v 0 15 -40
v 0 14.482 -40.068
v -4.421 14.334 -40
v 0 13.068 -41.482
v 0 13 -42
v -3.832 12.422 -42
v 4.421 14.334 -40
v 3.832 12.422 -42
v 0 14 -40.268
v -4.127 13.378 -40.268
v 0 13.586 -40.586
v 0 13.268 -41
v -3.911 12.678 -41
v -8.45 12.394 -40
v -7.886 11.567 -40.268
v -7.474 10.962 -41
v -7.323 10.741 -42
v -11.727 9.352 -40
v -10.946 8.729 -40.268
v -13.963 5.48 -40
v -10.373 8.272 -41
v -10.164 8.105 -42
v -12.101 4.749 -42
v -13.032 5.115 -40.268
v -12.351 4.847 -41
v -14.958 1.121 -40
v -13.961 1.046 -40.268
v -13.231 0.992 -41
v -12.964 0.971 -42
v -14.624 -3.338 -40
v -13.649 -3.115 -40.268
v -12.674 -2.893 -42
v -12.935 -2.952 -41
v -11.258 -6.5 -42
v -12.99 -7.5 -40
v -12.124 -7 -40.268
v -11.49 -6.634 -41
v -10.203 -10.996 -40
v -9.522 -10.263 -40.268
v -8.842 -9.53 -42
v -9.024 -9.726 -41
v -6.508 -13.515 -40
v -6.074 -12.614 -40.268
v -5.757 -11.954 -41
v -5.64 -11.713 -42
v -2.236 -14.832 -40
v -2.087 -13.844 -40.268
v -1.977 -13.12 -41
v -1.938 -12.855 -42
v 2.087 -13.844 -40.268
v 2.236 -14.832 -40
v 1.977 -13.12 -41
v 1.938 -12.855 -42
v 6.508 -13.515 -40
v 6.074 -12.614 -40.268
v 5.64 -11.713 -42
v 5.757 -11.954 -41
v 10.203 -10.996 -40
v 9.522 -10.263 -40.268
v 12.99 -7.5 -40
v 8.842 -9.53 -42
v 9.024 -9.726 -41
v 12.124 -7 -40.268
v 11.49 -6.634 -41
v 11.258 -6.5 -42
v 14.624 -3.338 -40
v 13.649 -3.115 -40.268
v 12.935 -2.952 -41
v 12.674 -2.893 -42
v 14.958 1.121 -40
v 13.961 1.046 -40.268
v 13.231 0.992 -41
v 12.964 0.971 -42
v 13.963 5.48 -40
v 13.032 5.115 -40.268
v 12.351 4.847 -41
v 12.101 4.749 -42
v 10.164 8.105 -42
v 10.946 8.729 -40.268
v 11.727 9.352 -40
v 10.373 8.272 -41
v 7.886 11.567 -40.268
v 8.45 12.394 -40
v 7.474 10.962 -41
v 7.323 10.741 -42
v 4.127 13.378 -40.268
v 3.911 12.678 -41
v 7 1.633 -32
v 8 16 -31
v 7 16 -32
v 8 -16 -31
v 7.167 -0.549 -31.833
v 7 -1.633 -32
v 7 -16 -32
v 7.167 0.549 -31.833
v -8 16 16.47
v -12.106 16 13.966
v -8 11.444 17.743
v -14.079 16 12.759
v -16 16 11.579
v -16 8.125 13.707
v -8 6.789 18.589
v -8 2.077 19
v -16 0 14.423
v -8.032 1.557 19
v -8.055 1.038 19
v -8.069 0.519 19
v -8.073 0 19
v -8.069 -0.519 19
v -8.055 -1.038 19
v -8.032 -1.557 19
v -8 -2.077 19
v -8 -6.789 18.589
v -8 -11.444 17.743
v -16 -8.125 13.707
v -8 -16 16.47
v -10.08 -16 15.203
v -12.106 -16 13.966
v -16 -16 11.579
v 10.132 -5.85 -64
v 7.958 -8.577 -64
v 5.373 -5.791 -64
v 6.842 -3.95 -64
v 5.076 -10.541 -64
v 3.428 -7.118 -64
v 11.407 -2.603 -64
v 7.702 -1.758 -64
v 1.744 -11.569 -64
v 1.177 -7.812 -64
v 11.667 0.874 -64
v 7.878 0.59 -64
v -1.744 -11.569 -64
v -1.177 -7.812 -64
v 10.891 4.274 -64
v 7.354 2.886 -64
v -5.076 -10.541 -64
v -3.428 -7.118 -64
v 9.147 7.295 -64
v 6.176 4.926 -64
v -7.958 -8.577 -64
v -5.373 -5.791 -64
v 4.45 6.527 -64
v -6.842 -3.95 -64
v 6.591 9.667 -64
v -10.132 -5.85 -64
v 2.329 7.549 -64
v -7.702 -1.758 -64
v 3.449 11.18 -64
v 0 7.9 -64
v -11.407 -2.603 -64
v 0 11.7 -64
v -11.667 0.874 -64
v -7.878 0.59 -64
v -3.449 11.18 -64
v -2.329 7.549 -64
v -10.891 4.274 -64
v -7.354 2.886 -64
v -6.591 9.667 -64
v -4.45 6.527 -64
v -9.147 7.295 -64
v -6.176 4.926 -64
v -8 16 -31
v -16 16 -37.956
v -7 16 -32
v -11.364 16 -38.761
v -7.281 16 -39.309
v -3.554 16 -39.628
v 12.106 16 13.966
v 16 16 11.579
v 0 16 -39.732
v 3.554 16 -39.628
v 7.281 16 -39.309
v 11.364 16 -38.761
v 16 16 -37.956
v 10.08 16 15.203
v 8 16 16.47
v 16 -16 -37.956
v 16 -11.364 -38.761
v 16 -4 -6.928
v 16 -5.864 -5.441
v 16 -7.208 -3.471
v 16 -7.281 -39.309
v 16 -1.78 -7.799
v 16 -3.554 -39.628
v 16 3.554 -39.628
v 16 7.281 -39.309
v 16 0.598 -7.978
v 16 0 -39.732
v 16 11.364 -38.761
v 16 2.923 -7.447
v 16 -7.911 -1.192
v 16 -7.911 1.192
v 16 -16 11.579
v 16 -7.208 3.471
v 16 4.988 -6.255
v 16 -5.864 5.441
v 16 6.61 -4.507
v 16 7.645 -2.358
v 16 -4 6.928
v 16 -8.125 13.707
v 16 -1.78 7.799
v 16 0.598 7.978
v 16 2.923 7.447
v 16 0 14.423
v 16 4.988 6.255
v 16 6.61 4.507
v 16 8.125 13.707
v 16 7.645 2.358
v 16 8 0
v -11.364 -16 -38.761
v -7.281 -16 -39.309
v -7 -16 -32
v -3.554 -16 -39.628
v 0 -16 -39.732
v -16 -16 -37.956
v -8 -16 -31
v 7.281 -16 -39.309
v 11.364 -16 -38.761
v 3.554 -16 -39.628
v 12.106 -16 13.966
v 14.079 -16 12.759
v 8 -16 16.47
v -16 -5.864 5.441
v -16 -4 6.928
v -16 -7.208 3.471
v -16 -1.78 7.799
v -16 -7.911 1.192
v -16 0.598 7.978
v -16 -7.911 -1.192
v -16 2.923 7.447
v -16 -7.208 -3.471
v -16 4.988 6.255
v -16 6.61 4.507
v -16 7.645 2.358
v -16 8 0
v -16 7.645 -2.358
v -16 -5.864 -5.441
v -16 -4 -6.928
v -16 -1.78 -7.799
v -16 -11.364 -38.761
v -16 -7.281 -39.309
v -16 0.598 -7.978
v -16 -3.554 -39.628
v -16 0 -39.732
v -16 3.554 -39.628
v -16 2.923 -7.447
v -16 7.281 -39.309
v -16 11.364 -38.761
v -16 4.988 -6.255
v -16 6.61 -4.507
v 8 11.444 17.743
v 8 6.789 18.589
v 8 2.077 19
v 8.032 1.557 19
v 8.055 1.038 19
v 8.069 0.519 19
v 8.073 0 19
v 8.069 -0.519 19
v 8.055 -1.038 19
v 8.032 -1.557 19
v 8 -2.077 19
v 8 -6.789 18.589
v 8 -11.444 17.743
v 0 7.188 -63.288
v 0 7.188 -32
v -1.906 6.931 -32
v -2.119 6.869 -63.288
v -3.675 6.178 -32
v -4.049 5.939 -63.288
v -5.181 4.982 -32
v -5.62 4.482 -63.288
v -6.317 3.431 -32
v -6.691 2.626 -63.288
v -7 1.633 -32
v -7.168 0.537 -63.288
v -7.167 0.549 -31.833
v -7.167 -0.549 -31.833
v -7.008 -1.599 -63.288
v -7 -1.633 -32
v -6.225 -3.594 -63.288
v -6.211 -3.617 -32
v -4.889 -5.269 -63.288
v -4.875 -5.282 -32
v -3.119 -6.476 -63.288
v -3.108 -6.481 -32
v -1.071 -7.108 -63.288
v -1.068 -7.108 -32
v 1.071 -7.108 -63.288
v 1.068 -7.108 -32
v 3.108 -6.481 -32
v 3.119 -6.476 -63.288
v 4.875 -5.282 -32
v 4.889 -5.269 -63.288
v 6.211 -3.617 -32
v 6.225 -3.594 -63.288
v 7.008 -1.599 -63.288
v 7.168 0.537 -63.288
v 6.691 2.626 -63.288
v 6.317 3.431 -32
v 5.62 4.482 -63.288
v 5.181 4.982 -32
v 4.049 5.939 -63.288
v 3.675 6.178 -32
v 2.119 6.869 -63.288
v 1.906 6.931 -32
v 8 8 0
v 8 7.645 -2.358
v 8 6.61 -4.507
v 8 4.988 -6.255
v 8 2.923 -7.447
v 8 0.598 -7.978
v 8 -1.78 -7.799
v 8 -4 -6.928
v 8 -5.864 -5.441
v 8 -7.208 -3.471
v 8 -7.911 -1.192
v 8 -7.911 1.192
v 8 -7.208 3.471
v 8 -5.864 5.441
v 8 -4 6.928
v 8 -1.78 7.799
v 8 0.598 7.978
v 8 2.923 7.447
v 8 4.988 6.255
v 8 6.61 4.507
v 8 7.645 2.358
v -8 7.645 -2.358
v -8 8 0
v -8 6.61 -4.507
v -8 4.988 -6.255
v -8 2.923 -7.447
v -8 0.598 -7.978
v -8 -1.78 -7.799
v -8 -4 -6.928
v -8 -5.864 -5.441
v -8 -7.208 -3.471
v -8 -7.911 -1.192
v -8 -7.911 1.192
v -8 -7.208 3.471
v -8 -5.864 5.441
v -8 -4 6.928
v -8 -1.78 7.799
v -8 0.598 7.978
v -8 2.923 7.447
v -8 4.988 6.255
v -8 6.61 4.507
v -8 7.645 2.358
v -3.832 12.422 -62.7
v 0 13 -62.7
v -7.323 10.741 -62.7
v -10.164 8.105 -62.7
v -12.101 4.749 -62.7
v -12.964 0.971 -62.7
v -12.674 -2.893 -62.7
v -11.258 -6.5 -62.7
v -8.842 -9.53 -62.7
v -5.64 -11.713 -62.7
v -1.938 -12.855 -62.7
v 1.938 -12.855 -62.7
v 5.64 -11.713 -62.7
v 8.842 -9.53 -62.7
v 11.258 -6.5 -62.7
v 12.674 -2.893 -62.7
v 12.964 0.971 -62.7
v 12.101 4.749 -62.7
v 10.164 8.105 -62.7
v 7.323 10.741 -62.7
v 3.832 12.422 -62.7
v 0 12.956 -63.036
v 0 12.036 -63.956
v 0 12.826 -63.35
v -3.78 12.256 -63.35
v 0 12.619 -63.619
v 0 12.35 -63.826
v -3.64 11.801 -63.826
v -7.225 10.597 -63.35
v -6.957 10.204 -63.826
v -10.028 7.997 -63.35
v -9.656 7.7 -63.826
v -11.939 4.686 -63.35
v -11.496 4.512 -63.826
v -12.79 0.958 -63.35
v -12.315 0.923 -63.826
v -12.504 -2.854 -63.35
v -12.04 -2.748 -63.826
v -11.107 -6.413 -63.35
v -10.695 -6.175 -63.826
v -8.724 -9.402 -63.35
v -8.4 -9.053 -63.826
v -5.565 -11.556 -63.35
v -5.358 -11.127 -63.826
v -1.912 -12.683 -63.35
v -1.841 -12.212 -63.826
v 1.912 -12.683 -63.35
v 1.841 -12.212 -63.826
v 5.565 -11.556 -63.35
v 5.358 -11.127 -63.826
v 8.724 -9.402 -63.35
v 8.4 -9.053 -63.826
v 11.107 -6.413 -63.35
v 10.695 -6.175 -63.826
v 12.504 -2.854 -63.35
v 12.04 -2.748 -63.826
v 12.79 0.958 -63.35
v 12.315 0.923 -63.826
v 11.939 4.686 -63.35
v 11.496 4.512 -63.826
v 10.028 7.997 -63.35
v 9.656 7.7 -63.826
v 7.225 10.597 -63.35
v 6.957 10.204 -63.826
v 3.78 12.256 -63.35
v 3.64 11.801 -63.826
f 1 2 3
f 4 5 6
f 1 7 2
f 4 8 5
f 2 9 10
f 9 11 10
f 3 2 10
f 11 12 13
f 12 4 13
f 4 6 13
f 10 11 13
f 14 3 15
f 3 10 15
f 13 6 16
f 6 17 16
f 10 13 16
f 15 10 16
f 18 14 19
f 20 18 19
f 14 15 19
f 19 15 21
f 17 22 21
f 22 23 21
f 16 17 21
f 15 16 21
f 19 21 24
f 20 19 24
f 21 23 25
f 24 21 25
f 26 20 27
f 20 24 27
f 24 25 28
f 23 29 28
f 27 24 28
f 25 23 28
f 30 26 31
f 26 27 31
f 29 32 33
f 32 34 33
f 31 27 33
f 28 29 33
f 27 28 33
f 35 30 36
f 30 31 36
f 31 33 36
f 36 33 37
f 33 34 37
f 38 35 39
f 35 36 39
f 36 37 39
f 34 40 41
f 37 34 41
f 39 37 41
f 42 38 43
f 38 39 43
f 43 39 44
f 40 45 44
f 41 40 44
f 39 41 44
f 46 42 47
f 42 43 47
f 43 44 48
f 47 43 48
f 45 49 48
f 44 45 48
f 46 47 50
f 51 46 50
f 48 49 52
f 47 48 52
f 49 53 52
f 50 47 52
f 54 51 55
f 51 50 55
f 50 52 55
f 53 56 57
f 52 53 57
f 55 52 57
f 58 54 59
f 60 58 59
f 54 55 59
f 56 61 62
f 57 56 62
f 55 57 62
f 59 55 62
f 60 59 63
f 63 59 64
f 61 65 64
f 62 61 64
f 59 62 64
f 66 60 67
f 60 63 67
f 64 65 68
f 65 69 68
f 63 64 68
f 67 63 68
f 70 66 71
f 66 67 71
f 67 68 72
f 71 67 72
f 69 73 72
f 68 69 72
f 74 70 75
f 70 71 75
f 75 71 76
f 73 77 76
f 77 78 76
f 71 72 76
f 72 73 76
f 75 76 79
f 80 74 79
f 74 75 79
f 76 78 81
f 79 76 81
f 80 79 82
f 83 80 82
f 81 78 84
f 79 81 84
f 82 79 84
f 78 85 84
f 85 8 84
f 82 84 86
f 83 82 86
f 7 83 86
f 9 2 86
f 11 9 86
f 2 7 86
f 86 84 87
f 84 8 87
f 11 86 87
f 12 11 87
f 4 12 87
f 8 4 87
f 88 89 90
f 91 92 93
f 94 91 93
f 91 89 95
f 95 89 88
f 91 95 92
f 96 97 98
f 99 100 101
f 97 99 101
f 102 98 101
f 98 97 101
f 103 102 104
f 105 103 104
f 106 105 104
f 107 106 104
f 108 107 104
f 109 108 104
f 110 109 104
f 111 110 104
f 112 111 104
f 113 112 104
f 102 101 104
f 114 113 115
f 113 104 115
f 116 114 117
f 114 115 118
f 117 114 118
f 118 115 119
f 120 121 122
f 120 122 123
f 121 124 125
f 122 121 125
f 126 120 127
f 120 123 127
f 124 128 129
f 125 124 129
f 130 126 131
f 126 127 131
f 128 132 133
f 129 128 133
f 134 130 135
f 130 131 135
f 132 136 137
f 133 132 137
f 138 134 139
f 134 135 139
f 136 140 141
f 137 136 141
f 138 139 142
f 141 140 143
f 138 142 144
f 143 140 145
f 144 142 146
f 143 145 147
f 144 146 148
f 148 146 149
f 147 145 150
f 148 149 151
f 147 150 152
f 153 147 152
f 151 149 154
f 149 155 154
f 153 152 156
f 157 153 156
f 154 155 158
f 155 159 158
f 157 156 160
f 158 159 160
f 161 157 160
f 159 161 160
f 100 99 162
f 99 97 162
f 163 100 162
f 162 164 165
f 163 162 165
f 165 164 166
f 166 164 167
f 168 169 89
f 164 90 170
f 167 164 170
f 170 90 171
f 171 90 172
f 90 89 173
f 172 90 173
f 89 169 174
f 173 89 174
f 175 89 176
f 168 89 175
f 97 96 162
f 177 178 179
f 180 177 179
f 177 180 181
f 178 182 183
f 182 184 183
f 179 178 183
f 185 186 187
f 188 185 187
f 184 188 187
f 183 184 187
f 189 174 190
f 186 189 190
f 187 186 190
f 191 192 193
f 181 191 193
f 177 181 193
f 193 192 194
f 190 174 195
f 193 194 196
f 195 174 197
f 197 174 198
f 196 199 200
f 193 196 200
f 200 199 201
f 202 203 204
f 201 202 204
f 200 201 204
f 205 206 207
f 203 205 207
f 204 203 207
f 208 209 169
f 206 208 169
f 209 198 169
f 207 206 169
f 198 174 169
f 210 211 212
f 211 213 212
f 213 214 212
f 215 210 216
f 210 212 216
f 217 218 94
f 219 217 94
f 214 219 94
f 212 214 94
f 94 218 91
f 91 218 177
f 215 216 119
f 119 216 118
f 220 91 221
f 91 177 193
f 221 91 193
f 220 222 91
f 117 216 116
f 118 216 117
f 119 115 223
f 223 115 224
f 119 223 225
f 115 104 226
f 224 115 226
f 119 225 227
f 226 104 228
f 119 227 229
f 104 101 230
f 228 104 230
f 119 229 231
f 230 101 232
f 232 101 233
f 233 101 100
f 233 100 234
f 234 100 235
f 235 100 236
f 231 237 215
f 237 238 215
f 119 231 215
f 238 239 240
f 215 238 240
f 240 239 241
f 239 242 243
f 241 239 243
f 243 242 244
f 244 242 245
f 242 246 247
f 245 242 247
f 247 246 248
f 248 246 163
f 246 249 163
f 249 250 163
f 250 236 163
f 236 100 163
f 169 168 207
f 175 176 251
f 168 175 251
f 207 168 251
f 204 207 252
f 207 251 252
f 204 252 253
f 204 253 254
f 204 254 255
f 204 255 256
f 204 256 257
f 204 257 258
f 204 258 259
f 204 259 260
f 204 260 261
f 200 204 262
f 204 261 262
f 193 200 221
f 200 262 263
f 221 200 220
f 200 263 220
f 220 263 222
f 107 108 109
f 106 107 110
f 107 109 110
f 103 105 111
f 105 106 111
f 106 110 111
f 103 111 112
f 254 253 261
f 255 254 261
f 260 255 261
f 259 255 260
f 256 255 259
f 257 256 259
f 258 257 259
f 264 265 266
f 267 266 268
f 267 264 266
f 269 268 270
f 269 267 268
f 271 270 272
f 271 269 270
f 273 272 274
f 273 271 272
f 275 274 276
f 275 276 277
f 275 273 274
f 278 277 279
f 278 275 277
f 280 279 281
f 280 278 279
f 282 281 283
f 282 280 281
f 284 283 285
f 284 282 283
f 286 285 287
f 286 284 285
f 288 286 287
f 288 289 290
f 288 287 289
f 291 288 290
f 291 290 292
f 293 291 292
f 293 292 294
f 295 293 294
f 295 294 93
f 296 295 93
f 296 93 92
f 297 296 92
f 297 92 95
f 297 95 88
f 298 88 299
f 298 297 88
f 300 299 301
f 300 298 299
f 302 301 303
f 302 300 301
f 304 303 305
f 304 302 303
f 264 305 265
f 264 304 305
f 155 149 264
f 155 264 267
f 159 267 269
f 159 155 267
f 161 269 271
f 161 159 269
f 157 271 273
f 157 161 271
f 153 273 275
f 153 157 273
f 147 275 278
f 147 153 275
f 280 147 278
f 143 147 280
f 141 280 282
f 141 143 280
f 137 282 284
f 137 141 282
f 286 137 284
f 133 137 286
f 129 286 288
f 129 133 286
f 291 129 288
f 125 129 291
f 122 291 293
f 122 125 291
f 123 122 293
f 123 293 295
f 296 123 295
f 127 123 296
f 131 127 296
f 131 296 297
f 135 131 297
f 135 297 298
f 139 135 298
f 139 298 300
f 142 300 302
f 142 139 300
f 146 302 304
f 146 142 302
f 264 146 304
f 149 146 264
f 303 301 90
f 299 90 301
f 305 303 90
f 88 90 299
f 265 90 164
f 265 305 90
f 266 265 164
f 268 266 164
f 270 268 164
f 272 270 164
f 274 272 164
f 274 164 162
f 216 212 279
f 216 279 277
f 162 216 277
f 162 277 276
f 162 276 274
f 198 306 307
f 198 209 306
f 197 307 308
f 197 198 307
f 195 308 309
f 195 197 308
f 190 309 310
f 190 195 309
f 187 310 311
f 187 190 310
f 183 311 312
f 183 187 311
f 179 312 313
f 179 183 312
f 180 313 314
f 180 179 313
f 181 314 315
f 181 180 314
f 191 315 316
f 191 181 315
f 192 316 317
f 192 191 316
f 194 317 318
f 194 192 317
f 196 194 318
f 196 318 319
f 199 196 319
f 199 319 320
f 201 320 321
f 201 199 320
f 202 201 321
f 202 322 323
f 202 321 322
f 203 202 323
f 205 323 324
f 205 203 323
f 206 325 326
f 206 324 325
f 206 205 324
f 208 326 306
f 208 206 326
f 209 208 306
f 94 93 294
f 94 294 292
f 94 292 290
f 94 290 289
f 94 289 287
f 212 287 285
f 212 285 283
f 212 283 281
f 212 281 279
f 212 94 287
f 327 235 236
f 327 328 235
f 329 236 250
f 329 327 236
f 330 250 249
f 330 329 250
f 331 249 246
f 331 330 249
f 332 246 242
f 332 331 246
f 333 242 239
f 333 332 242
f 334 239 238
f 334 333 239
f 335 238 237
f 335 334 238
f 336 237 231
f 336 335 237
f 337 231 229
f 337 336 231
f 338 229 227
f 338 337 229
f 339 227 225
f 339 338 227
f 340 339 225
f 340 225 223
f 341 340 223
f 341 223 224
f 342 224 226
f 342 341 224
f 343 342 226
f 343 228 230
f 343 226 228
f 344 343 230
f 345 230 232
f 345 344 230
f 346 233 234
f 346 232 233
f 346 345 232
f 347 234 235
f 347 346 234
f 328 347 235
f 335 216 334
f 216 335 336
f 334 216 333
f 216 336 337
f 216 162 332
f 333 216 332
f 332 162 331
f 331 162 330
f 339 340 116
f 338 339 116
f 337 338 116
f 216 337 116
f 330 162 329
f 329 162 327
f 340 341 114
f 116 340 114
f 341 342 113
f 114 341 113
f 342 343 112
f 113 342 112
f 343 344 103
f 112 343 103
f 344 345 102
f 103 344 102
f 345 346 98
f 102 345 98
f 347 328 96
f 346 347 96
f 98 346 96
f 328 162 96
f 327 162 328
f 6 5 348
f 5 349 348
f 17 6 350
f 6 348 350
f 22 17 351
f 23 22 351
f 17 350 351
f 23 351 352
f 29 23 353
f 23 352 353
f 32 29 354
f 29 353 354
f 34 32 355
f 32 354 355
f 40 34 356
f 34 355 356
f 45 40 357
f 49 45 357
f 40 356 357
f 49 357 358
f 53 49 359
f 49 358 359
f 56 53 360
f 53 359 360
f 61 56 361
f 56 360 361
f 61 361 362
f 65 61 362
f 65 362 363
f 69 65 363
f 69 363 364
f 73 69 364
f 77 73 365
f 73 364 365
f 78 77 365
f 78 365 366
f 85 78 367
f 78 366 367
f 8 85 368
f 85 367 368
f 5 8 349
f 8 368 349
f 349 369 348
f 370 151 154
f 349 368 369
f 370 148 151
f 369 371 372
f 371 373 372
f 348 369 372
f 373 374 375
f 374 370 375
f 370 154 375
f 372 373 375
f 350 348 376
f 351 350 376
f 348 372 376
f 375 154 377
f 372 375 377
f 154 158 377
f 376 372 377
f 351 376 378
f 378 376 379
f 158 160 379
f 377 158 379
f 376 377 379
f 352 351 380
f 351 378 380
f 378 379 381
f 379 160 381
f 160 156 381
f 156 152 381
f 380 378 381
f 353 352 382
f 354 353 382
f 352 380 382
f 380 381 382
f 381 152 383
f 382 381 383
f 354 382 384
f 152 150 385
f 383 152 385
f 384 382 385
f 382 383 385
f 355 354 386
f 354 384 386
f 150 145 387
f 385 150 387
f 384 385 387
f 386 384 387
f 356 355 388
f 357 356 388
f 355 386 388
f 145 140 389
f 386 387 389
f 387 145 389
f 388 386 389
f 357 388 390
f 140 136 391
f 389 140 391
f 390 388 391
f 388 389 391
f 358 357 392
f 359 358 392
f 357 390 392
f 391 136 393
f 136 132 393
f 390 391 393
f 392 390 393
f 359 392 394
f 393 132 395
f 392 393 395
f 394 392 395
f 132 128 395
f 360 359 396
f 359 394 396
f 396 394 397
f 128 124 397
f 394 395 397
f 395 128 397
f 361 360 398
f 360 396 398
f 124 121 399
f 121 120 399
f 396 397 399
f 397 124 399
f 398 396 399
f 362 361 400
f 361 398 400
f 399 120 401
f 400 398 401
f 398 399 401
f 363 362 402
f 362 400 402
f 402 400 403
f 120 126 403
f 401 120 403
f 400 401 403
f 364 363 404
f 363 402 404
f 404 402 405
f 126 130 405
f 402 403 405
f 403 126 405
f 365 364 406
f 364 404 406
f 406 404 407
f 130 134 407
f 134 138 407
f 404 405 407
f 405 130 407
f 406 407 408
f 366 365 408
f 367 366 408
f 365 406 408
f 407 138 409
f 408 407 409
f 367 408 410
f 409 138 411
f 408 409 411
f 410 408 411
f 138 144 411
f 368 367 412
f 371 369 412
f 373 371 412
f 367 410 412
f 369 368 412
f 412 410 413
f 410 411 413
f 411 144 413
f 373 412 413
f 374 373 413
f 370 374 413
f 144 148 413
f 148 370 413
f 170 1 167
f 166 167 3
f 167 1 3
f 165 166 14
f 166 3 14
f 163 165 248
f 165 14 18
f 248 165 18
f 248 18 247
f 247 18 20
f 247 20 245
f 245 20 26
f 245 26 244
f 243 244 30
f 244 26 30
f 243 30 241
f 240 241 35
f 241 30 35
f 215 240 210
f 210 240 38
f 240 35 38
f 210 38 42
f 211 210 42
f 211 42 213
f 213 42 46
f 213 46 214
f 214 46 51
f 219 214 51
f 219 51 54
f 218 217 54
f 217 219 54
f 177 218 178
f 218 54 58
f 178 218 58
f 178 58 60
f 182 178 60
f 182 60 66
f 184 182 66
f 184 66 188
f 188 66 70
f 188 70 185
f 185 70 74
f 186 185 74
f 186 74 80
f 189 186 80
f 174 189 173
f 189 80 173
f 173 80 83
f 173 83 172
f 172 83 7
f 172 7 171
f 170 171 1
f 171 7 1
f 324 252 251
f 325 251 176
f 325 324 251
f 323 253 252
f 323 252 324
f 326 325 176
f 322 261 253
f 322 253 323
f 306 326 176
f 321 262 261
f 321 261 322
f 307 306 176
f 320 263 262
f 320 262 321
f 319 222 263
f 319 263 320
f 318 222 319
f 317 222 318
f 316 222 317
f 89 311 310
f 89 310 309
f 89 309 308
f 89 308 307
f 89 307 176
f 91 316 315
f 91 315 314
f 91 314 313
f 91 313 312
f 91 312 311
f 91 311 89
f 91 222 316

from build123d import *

# Parameters (mm, degrees)
CUT_EXTRUDE1_DEPTH           = 33
CUT_EXTRUDE1_DEPTH_BACK      = 33
CUT_EXTRUDE2_DEPTH           = 33
CUT_EXTRUDE2_DEPTH_BACK      = 33
CUT_EXTRUDE3_DEPTH           = 33
CUT_EXTRUDE3_DEPTH_BACK      = 33
SKETCH5_W                    = 39.5
SKETCH5_H                    = 8
CUT_REVOLVE3_ANGLE           = 90
CUT_REVOLVE3_OTHER_WAY_ANGLE = 90


with BuildPart() as part:
    # Sketch1 → Revolve1 (revolve)
    with BuildSketch(Plane(origin=(0, 0, 0), x_dir=(0, 0, -1), z_dir=(1, 0, 0))):
        with BuildLine():
            Line((-19, 0), (-19, 32))
            Line((-19, 32), (35.444863729, 32))
            Line((35.444863729, 32), (40, 15))
            ThreePointArc((40, 15), (40.585786438, 13.585786438), (42, 13))
            Line((42, 13), (62.7, 13))
            ThreePointArc((62.7, 13), (63.619238816, 12.619238816), (64, 11.7))
            Line((64, 11.7), (64, 0))
            Line((64, 0), (-19, 0))
        make_face()
    revolve(axis=Axis((0, 0, -64), (0, 0, 1)))

    # Sketch2 → Cut-Extrude1 (cut, two sides)
    with BuildSketch(Plane(origin=(0, 0, 0), x_dir=(1, 0, 0), z_dir=(0, 1, 0))) as cut_extrude1_sk:
        Polygon((-8, 31), (-8, -20), (8, -20), (8, 31), (7, 32), (-7, 32), align=None)
    extrude(amount=CUT_EXTRUDE1_DEPTH, mode=Mode.SUBTRACT)
    extrude(cut_extrude1_sk.sketch, amount=-CUT_EXTRUDE1_DEPTH_BACK, mode=Mode.SUBTRACT)

    # Sketch3 → Cut-Extrude2 (cut, two sides)
    with BuildSketch(Plane(origin=(0, 0, 0), x_dir=(0, 0, -1), z_dir=(1, 0, 0))) as cut_extrude2_sk:
        Polygon((-52, -48), (64, -48), (64, -16), (-20, -16), (-20, 16), (64, 16), (64, 48), (-52, 48), align=None)
    extrude(amount=CUT_EXTRUDE2_DEPTH, mode=Mode.SUBTRACT)
    extrude(cut_extrude2_sk.sketch, amount=-CUT_EXTRUDE2_DEPTH_BACK, mode=Mode.SUBTRACT)

    # Sketch4 → Cut-Extrude3 (cut, two sides)
    with BuildSketch(Plane(origin=(0, 0, 0), x_dir=(1, 0, 0), z_dir=(0, 1, 0))) as cut_extrude3_sk:
        Polygon((-48, -52), (48, -52), (48, 64), (16, 64), (16, -20), (-16, -20), (-16, 64), (-48, 64), align=None)
    extrude(amount=CUT_EXTRUDE3_DEPTH, mode=Mode.SUBTRACT)
    extrude(cut_extrude3_sk.sketch, amount=-CUT_EXTRUDE3_DEPTH_BACK, mode=Mode.SUBTRACT)

    # Sketch5 → Cut-Revolve1 (revolve, cut)
    with BuildSketch(Plane.XY):
        with Locations((0, 4)):
            Rectangle(SKETCH5_W, SKETCH5_H)
    revolve(axis=Axis((19.75, 0, 0), (-1, 0, 0)), mode=Mode.SUBTRACT)

    # Sketch6 → Cut-Revolve2 (revolve, cut)
    with BuildSketch(Plane(origin=(0, 0, 0), x_dir=(0, 0, -1), z_dir=(1, 0, 0))):
        Polygon((30.9, 0), (30.9, 7.188), (63.288, 7.188), (64.1, 8), (64.1, 0), align=None)
    revolve(axis=Axis((0, 0, -64.1), (0, 0, 1)), mode=Mode.SUBTRACT)

    # Sketch7 → Cut-Revolve3 (revolve, cut)
    with BuildSketch(Plane(origin=(0, 0, 0), x_dir=(1, 0, 0), z_dir=(0, 1, 0))):
        Polygon((-19, -49.64182924), (0, -60.611484355), (19, -49.64182924), (19, -12.691412012), (0, -23.661067127), (-19, -12.691412012), align=None)
    revolve(axis=Axis((-19, 0, -32), (1, 0, 0)), revolution_arc=CUT_REVOLVE3_ANGLE, mode=Mode.SUBTRACT)

    # Sketch7 → Cut-Revolve3 other way (revolve, cut)
    with BuildSketch(Plane(origin=(0, 0, 0), x_dir=(1, 0, 0), z_dir=(0, 1, 0))):
        Polygon((-19, -49.64182924), (0, -60.611484355), (19, -49.64182924), (19, -12.691412012), (0, -23.661067127), (-19, -12.691412012), align=None)
    revolve(axis=Axis((-19, 0, -32), (-1, 0, 0)), revolution_arc=CUT_REVOLVE3_OTHER_WAY_ANGLE, mode=Mode.SUBTRACT)


solid = part.part
